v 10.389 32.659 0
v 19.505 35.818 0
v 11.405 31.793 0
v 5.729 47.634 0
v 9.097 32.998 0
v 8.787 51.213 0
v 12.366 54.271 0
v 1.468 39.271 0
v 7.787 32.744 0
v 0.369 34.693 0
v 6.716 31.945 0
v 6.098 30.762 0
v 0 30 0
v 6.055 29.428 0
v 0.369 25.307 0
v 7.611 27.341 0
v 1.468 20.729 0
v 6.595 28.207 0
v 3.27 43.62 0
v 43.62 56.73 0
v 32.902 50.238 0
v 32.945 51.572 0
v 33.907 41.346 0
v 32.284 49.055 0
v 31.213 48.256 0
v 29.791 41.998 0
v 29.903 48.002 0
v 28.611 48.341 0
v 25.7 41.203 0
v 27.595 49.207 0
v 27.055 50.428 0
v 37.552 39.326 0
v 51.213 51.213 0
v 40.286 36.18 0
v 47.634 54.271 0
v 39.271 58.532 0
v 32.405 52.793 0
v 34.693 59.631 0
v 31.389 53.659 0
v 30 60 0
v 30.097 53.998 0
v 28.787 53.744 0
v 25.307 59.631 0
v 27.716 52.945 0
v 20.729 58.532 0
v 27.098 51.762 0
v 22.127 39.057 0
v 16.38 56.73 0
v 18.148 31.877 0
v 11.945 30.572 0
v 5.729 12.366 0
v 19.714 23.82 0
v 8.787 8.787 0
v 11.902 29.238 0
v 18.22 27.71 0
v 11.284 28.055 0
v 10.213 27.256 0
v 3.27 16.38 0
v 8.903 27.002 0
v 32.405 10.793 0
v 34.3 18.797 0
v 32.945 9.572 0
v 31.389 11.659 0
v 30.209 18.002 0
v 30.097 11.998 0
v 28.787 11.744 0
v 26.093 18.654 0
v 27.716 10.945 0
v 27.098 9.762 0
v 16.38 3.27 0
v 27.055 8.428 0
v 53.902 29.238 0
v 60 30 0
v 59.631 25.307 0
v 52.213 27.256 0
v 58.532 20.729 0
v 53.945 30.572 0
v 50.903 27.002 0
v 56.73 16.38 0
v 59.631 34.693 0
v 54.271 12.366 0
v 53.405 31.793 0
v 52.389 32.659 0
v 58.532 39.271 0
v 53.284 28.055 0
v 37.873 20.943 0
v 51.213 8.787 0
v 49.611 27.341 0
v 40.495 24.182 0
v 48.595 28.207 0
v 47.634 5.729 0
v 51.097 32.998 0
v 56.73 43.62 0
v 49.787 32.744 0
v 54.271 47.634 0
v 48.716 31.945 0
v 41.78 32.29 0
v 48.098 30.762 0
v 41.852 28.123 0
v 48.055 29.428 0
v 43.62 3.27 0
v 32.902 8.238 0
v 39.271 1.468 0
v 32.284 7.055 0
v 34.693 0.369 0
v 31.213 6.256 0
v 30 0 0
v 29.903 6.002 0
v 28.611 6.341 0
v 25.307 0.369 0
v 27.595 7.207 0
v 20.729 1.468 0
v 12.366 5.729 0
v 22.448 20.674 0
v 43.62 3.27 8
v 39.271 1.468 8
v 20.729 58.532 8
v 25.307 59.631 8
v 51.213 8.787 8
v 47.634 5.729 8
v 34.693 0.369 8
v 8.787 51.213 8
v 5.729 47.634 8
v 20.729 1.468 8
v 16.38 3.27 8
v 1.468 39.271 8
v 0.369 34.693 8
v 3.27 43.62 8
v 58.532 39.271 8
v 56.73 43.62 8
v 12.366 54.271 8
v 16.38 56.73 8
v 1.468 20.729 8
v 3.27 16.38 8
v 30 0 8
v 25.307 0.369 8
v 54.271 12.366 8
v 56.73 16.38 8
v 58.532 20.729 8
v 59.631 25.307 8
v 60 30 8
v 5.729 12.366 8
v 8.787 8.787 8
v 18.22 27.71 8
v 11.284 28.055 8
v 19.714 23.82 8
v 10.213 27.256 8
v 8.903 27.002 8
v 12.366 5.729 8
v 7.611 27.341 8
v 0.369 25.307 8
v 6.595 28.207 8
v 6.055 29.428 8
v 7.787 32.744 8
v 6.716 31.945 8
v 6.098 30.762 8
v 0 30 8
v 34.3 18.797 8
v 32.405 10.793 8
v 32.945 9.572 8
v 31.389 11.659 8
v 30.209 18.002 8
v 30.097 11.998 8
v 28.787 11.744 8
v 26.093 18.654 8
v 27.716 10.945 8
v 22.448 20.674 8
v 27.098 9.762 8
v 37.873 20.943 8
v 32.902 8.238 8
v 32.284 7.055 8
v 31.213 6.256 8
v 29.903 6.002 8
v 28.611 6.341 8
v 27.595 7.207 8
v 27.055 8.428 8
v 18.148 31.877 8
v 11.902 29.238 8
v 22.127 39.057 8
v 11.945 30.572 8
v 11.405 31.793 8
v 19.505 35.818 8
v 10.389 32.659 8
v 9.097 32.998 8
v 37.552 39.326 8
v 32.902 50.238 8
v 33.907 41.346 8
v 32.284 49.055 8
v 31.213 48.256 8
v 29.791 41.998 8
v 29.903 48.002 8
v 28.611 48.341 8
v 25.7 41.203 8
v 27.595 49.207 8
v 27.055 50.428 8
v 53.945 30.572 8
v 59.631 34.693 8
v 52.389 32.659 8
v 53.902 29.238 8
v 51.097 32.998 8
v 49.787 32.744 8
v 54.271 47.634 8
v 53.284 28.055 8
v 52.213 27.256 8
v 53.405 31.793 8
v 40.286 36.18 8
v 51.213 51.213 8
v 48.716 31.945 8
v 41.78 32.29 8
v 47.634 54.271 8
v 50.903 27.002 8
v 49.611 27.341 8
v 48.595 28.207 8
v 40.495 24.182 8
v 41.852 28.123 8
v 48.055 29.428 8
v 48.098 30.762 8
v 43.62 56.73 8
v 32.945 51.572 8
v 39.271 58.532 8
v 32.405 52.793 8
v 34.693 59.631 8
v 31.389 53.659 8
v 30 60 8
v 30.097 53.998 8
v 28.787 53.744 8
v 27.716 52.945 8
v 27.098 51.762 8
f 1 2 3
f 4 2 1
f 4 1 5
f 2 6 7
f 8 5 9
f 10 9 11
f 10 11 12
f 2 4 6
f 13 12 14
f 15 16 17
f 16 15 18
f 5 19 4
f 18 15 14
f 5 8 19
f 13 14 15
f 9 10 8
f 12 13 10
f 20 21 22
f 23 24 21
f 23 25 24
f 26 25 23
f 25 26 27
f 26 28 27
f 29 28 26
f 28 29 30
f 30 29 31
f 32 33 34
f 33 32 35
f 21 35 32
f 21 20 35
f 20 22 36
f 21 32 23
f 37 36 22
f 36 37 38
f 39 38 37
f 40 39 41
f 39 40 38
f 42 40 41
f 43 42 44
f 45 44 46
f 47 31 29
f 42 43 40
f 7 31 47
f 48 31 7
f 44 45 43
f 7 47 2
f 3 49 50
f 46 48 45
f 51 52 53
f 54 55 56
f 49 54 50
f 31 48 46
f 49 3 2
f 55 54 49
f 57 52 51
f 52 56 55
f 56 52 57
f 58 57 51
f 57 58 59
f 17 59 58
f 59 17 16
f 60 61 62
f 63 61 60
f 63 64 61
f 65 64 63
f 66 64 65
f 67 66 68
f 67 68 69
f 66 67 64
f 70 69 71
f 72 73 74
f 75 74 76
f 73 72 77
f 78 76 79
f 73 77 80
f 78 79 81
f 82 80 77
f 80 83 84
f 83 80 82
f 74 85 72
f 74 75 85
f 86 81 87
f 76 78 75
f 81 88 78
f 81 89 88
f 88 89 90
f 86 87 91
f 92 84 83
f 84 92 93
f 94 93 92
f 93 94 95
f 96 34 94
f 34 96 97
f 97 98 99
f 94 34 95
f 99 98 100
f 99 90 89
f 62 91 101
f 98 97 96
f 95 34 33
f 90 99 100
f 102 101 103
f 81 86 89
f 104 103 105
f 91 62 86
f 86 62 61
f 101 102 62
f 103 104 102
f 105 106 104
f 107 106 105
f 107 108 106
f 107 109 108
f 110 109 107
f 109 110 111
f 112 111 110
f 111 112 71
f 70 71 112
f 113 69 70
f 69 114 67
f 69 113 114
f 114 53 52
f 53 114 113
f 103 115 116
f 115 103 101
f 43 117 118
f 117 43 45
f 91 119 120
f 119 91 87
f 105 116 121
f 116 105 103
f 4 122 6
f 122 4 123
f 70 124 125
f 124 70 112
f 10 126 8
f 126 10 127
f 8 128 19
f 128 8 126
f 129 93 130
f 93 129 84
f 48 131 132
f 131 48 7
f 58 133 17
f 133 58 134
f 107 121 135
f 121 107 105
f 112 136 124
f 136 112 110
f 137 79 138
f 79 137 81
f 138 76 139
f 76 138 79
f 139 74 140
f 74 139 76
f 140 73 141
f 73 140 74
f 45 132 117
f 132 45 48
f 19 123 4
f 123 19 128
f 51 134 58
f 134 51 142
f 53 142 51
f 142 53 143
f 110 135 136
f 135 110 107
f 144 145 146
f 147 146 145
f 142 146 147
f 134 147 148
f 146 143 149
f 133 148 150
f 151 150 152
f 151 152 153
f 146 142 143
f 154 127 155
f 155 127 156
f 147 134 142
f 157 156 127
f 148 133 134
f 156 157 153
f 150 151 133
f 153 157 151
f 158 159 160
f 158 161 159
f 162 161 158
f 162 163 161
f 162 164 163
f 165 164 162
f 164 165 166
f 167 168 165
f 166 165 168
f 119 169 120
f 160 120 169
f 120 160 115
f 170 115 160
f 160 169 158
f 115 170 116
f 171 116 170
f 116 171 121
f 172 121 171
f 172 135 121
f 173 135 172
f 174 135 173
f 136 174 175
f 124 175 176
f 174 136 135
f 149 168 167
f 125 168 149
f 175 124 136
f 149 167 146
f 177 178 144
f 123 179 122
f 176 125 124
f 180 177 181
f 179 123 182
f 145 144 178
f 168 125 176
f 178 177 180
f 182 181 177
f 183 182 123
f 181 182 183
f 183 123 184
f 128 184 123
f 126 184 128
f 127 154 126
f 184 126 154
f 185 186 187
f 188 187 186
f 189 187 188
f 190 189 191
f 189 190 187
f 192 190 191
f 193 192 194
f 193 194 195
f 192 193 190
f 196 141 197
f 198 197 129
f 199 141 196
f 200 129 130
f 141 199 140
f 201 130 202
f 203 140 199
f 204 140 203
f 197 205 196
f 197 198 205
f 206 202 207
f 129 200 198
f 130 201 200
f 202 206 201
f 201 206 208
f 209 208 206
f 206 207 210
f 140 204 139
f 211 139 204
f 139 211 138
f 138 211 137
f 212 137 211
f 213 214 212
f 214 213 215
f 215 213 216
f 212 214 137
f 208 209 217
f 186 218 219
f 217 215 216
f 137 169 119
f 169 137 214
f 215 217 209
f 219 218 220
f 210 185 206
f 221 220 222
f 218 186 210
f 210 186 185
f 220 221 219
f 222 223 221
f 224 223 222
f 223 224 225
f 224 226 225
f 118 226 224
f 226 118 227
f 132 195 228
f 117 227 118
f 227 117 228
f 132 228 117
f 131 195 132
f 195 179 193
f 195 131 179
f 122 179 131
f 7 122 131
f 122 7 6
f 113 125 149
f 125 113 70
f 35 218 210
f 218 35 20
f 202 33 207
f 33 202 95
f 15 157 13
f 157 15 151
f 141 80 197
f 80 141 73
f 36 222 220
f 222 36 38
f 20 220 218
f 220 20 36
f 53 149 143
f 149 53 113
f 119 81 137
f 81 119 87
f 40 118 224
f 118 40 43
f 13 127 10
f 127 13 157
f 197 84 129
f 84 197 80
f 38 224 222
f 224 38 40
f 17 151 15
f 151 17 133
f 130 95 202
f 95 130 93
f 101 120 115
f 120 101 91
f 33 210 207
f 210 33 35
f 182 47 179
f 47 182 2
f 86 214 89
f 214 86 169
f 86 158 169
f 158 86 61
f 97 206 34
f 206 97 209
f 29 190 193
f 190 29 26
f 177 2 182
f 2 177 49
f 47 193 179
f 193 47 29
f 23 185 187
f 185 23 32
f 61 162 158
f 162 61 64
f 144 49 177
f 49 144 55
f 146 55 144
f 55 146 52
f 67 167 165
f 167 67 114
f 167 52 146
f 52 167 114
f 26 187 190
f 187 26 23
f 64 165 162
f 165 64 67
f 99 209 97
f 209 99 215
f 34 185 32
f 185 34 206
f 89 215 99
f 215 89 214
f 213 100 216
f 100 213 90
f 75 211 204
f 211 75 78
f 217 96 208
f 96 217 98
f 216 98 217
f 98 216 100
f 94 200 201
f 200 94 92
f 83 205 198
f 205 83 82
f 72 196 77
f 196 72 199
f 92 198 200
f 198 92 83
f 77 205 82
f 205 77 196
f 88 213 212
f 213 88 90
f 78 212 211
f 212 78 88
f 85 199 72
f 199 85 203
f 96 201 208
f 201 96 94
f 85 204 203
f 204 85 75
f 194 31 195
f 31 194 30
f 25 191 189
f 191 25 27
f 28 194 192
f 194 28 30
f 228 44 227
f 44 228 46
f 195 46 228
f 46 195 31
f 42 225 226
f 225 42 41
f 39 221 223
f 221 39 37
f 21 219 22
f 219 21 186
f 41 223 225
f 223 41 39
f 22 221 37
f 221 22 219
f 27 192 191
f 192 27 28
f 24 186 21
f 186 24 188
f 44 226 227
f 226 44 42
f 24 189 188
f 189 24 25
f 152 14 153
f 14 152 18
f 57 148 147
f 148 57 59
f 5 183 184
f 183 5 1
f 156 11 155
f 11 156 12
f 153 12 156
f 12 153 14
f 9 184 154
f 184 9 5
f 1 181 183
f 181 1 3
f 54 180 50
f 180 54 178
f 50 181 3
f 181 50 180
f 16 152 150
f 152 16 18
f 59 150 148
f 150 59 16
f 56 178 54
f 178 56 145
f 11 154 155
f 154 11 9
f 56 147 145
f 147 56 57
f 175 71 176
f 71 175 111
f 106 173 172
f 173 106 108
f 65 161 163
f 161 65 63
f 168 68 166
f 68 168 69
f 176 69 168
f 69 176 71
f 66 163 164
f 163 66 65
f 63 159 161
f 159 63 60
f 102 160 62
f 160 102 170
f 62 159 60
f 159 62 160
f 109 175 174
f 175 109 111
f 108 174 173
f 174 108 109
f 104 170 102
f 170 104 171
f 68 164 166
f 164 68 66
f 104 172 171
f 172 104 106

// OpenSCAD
$fn = 32;

// ----------------------------------------------------------------------
// Spacer plate: round flange R30, 4 bolts
// ----------------------------------------------------------------------

// --- parameters (mm) ---
bore_r = 12;              // centre bore radius
bolt_r = 3;               // bolt hole radius
plate_t = 8;              // plate thickness, Z (extrusion height)
flange_r = 30;            // flange radius
n_bolt = 4;               // bolt hole count
ring_r = 21;              // bolt circle radius

profile = [[60, 30], [59.631, 34.693], [58.532, 39.271], [56.73, 43.62], [54.271, 47.634], [51.213, 51.213], [47.634, 54.271], [43.62, 56.73], [39.271, 58.532], [34.693, 59.631], [30, 60], [25.307, 59.631], [20.729, 58.532], [16.38, 56.73], [12.366, 54.271], [8.787, 51.213], [5.729, 47.634], [3.27, 43.62], [1.468, 39.271], [0.369, 34.693], [0, 30], [0.369, 25.307], [1.468, 20.729], [3.27, 16.38], [5.729, 12.366], [8.787, 8.787], [12.366, 5.729], [16.38, 3.27], [20.729, 1.468], [25.307, 0.369], [30, 0], [34.693, 0.369], [39.271, 1.468], [43.62, 3.27], [47.634, 5.729], [51.213, 8.787], [54.271, 12.366], [56.73, 16.38], [58.532, 20.729], [59.631, 25.307]];  // primary outline, 40 points, counter clockwise
void_1 = [[41.78, 32.29], [40.286, 36.18], [37.552, 39.326], [33.907, 41.346], [29.791, 41.998], [25.7, 41.203], [22.127, 39.057], [19.505, 35.818], [18.148, 31.877], [18.22, 27.71], [19.714, 23.82], [22.448, 20.674], [26.093, 18.654], [30.209, 18.002], [34.3, 18.797], [37.873, 20.943], [40.495, 24.182], [41.852, 28.123]];  // centre bore, 18 points
void_2 = [[53.945, 30.572], [53.405, 31.793], [52.389, 32.659], [51.097, 32.998], [49.787, 32.744], [48.716, 31.945], [48.098, 30.762], [48.055, 29.428], [48.595, 28.207], [49.611, 27.341], [50.903, 27.002], [52.213, 27.256], [53.284, 28.055], [53.902, 29.238]];  // bolt hole 1, 14 points
void_3 = [[32.945, 51.572], [32.405, 52.793], [31.389, 53.659], [30.097, 53.998], [28.787, 53.744], [27.716, 52.945], [27.098, 51.762], [27.055, 50.428], [27.595, 49.207], [28.611, 48.341], [29.903, 48.002], [31.213, 48.256], [32.284, 49.055], [32.902, 50.238]];  // bolt hole 2, 14 points
void_4 = [[11.945, 30.572], [11.405, 31.793], [10.389, 32.659], [9.097, 32.998], [7.787, 32.744], [6.716, 31.945], [6.098, 30.762], [6.055, 29.428], [6.595, 28.207], [7.611, 27.341], [8.903, 27.002], [10.213, 27.256], [11.284, 28.055], [11.902, 29.238]];  // bolt hole 3, 14 points
void_5 = [[32.945, 9.572], [32.405, 10.793], [31.389, 11.659], [30.097, 11.998], [28.787, 11.744], [27.716, 10.945], [27.098, 9.762], [27.055, 8.428], [27.595, 7.207], [28.611, 6.341], [29.903, 6.002], [31.213, 6.256], [32.284, 7.055], [32.902, 8.238]];  // bolt hole 4, 14 points

// --- the one profile operation ---
difference() {
  linear_extrude(height = plate_t) polygon(points = profile);
  translate([0, 0, -1])
    linear_extrude(height = plate_t + 2) polygon(points = void_1);
  translate([0, 0, -1])
    linear_extrude(height = plate_t + 2) polygon(points = void_2);
  translate([0, 0, -1])
    linear_extrude(height = plate_t + 2) polygon(points = void_3);
  translate([0, 0, -1])
    linear_extrude(height = plate_t + 2) polygon(points = void_4);
  translate([0, 0, -1])
    linear_extrude(height = plate_t + 2) polygon(points = void_5);
}
